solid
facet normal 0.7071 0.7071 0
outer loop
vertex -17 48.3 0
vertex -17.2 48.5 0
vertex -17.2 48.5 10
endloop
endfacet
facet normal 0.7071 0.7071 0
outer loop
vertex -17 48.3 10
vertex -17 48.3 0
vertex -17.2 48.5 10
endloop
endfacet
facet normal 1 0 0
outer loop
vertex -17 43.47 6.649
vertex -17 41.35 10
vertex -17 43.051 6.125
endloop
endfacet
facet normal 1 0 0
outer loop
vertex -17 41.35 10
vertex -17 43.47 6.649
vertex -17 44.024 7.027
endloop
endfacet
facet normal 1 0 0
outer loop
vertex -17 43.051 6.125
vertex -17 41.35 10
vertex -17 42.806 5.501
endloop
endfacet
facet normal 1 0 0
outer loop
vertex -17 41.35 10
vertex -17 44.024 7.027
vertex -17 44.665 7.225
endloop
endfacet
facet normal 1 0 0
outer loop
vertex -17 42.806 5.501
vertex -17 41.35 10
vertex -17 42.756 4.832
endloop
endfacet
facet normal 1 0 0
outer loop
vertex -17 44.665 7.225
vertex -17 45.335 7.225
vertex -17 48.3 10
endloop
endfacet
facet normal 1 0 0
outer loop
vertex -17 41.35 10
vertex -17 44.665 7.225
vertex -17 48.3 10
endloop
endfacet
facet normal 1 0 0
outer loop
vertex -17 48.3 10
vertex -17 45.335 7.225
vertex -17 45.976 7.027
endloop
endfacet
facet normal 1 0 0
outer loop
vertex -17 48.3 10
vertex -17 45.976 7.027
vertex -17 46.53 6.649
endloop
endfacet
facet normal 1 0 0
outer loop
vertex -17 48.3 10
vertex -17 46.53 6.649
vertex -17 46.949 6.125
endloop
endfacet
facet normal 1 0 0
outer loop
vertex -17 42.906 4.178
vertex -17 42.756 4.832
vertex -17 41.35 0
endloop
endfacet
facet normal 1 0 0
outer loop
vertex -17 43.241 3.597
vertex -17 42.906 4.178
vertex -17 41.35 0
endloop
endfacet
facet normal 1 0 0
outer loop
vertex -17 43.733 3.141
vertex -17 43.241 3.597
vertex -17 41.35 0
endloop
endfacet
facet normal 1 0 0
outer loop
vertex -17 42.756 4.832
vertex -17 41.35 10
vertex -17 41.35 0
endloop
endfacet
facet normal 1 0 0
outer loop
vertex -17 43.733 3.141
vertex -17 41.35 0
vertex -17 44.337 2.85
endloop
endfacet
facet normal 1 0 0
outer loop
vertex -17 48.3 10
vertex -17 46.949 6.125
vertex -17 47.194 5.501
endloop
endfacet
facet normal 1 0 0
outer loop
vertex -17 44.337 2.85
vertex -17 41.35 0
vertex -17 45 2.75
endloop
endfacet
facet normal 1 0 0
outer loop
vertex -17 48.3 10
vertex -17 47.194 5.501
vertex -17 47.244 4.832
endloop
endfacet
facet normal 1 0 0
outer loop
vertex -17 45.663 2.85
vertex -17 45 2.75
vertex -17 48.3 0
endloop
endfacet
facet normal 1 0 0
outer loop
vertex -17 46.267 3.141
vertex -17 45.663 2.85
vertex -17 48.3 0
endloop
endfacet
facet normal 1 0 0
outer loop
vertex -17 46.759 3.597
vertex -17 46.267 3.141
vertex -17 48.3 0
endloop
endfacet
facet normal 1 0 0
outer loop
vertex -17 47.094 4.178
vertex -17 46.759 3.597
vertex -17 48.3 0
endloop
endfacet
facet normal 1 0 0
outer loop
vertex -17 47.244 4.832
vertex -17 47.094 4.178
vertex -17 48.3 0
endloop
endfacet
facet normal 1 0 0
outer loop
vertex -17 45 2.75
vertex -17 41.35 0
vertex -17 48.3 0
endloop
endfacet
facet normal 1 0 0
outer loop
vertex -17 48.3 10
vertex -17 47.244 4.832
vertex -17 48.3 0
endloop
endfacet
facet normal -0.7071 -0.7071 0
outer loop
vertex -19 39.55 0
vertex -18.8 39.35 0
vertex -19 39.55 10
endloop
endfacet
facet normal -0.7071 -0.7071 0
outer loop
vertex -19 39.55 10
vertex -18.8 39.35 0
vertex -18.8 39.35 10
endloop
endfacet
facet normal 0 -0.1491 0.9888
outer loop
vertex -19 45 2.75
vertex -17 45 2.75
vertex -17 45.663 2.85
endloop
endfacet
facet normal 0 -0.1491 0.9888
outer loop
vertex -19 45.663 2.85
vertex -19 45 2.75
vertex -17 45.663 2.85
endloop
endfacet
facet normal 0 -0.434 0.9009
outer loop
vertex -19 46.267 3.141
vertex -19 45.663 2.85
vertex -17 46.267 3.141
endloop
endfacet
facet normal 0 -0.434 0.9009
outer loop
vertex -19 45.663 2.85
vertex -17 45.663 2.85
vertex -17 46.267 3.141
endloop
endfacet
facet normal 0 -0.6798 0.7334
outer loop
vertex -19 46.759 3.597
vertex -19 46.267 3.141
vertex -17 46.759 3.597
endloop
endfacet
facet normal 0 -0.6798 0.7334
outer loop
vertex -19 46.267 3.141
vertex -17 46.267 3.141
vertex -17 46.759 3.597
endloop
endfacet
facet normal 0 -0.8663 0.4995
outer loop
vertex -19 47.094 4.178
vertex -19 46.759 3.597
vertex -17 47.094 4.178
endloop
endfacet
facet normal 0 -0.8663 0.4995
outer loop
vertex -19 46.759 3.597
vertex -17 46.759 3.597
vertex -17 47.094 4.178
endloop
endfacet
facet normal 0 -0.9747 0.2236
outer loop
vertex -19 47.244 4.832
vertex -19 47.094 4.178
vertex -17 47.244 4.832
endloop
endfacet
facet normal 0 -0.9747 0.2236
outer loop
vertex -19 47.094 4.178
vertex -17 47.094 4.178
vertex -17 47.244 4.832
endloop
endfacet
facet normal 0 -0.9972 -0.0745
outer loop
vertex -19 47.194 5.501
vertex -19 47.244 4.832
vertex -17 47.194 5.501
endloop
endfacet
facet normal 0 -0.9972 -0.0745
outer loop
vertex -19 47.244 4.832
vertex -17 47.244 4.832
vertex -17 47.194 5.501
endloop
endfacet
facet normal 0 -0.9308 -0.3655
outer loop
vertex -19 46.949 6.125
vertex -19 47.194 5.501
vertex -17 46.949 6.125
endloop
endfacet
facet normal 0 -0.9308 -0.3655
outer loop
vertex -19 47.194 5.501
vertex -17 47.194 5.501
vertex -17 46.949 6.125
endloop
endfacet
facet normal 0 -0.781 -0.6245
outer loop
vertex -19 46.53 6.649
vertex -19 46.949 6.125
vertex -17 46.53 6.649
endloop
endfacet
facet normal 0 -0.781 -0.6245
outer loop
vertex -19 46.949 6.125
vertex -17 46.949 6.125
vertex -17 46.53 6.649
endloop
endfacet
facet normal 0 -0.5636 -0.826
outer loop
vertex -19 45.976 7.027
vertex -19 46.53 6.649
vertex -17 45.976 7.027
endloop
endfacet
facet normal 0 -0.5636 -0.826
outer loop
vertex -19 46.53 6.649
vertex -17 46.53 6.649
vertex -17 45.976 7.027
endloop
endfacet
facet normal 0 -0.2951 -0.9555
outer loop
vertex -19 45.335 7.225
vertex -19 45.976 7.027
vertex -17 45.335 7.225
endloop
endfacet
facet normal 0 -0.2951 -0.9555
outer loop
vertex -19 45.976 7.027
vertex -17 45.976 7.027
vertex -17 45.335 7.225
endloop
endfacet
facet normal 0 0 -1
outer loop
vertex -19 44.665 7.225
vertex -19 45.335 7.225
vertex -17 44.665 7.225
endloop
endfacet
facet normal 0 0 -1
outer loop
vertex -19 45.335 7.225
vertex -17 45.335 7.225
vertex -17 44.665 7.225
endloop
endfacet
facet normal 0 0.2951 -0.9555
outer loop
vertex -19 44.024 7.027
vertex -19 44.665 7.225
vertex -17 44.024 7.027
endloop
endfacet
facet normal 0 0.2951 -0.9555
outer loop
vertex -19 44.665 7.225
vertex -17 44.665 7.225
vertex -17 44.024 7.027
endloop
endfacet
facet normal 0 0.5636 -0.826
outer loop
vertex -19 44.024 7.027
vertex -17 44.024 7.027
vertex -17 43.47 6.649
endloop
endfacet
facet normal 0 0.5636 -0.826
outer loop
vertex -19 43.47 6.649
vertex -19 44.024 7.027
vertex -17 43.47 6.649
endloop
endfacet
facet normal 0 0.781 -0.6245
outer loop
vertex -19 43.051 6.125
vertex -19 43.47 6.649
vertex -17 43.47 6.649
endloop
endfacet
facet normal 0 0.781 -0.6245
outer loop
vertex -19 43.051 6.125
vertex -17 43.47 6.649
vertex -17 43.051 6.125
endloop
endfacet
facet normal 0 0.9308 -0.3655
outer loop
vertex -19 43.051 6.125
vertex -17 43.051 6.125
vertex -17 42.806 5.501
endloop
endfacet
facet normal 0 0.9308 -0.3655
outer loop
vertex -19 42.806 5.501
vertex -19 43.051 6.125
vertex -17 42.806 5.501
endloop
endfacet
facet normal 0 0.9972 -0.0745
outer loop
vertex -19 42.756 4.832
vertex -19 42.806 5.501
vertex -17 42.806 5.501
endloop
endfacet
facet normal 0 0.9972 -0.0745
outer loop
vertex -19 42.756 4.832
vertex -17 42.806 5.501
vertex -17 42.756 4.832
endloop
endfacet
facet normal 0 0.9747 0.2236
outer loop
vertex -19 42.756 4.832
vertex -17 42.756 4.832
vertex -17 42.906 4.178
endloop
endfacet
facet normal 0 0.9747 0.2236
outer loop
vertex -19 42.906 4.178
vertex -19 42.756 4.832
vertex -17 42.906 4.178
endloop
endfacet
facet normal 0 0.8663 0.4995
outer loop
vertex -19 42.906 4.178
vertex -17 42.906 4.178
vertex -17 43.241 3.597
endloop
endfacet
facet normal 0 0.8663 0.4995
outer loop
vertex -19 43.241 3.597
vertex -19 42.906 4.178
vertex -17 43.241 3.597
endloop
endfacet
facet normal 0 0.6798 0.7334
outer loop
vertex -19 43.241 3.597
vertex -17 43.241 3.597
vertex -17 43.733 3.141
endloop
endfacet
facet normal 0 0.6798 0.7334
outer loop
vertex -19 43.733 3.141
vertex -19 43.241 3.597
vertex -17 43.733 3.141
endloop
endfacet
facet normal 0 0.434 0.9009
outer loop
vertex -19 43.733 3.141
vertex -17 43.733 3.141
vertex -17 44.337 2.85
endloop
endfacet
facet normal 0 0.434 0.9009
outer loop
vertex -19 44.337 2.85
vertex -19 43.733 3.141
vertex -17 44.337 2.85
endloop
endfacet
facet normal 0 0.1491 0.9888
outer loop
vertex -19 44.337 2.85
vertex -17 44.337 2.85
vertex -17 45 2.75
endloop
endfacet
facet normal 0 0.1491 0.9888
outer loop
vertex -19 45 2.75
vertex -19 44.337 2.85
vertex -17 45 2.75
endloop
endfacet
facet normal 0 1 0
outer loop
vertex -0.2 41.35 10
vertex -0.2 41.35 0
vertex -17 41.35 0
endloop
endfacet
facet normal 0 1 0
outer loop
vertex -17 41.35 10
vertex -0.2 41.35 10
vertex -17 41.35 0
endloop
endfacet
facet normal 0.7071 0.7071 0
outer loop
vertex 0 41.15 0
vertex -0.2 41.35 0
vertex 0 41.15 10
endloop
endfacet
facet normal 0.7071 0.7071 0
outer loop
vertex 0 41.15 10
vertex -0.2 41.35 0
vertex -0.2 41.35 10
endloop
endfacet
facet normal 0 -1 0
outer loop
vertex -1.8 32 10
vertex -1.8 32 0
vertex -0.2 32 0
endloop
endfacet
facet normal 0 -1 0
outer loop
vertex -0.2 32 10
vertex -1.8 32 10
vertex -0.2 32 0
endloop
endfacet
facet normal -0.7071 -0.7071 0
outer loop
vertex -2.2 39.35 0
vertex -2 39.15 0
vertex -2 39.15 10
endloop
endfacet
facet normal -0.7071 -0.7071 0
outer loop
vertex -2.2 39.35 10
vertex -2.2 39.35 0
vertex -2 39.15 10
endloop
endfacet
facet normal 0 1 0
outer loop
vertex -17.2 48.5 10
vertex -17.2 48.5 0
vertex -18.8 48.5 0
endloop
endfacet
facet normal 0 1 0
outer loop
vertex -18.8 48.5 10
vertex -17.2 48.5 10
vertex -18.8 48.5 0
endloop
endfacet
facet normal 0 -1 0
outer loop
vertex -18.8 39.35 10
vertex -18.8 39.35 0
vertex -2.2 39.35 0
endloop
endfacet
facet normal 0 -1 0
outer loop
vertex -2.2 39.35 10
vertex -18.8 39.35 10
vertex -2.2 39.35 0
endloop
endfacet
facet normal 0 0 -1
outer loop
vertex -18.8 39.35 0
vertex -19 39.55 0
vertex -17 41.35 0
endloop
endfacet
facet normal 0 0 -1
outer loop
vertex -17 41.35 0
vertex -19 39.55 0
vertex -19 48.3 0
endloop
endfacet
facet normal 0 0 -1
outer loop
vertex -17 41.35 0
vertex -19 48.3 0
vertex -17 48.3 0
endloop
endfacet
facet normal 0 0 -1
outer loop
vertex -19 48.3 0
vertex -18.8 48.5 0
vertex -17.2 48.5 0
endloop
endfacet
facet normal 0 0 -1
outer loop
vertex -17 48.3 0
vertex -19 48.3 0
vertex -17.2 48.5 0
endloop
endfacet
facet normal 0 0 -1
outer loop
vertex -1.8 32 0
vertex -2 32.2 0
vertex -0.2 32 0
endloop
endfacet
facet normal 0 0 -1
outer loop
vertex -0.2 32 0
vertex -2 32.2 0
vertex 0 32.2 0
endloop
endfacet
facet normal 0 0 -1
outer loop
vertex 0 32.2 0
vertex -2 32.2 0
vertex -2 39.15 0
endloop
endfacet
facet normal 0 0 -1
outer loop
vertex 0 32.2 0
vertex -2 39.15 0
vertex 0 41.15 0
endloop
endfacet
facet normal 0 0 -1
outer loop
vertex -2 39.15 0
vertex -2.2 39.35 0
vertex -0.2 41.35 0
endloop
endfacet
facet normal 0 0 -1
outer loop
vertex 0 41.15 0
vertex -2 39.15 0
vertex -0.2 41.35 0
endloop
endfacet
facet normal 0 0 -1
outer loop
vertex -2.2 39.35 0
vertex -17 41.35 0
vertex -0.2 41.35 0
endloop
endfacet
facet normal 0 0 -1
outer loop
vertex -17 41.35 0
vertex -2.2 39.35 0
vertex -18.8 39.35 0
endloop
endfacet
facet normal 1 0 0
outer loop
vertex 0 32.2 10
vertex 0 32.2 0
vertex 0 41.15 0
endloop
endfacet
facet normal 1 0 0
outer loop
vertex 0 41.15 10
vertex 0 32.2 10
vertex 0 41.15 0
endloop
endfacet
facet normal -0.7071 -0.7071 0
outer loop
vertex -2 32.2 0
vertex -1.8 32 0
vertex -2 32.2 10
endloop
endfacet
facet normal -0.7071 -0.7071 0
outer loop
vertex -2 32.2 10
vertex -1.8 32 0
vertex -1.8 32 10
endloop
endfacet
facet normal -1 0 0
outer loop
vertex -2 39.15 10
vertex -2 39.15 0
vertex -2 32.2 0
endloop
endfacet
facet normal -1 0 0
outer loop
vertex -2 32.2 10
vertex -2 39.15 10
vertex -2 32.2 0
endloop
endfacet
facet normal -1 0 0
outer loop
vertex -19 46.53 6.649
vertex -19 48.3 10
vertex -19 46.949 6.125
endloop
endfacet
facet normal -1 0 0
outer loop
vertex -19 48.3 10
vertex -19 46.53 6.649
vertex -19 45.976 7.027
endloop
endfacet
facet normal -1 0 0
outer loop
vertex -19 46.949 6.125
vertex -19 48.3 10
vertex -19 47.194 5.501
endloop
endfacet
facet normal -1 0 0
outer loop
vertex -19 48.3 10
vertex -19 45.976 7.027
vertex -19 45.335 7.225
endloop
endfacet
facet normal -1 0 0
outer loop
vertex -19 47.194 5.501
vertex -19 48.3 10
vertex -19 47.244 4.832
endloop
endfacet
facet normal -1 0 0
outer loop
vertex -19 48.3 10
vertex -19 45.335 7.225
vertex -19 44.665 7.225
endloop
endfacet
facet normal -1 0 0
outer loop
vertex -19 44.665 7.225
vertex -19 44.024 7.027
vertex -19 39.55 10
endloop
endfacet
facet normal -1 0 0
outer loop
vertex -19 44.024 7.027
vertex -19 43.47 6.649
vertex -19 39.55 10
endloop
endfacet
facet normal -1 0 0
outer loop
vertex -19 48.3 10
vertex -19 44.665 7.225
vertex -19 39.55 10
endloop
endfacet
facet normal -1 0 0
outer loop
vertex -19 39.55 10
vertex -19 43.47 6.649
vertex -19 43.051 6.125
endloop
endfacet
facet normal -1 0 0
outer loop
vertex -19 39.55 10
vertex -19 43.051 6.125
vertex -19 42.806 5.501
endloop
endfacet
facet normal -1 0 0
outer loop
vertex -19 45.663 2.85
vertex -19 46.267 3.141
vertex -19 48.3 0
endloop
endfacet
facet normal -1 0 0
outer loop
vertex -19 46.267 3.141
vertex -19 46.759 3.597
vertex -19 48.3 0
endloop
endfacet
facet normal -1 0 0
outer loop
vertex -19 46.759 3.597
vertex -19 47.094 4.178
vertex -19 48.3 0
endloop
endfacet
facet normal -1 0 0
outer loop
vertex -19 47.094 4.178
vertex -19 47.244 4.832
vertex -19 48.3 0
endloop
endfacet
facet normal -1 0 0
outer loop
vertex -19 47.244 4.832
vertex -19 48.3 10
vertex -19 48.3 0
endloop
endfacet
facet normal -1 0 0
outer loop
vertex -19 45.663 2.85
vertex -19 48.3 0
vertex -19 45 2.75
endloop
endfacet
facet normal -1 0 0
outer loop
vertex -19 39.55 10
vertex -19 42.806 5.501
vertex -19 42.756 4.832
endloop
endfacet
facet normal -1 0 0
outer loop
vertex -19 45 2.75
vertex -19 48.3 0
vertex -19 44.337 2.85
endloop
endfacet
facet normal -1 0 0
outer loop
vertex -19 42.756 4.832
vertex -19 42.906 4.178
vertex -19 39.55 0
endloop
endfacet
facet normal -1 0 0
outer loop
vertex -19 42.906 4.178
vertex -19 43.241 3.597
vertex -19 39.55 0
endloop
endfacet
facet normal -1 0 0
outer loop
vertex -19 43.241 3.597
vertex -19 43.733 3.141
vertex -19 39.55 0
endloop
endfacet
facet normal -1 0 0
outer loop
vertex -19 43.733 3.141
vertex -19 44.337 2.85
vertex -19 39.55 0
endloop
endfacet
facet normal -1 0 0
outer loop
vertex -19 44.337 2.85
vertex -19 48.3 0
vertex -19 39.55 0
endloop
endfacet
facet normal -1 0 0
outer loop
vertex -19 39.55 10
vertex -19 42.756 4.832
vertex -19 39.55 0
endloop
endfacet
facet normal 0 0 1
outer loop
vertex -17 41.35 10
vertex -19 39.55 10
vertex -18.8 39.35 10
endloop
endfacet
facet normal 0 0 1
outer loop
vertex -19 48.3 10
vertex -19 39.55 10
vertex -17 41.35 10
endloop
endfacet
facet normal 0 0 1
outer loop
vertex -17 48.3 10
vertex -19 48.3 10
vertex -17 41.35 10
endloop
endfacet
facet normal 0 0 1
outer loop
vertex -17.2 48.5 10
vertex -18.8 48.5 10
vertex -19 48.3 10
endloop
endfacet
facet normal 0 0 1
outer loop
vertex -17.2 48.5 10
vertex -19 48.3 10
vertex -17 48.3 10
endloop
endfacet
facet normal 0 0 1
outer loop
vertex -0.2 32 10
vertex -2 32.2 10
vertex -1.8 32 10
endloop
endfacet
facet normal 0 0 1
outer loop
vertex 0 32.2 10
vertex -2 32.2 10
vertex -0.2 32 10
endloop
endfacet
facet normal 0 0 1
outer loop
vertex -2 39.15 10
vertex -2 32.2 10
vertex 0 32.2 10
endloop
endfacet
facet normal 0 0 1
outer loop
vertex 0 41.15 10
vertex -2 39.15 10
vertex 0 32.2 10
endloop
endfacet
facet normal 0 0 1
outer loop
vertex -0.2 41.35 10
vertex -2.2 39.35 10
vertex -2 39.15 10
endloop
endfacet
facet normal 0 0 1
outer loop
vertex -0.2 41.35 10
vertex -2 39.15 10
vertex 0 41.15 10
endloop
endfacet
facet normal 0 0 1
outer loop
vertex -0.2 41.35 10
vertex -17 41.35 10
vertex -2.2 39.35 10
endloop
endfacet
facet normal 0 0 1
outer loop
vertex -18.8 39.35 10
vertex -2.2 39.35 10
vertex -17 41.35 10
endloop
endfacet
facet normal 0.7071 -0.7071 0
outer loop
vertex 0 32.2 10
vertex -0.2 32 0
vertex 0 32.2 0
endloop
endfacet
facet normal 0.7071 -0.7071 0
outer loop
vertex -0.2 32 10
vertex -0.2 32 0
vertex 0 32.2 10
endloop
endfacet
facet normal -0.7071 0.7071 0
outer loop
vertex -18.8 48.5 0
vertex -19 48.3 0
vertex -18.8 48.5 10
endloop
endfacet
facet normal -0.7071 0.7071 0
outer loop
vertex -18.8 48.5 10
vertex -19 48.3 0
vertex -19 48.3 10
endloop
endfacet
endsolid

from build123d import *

# Parameters (mm, degrees)
BOSS_EXTRU_1_DEPTH = 10
CHANFREIN2_SIZE    = 0.2
D_GAGEMENT_M41_D   = 4.5


with BuildPart() as part:
    # Esquisse1 → Boss.-Extru.1 (new body)
    with BuildSketch(Plane.XY):
        Polygon((0, 32), (0, 41.35), (-17, 41.35), (-17, 48.5), (-19, 48.5), (-19, 39.35), (-2, 39.35), (-2, 32), align=None)
    extrude(amount=BOSS_EXTRU_1_DEPTH)

    # Chanfrein2
    chanfrein2_edges = [part.edges().sort_by_distance(p)[0] for p in [
        (0, 41.35, 5),
        (0, 32, 5),
        (-2, 32, 5),
        (-2, 39.35, 5),
        (-19, 39.35, 5),
        (-19, 48.5, 5),
        (-17, 48.5, 5),
    ]]
    chamfer(chanfrein2_edges, length=CHANFREIN2_SIZE)

    # Dégagement M41 (through all)
    with Locations(Plane.ZY.offset(19)):
        with Locations((5, 45)):
            Hole(D_GAGEMENT_M41_D / 2)


solid = part.part
